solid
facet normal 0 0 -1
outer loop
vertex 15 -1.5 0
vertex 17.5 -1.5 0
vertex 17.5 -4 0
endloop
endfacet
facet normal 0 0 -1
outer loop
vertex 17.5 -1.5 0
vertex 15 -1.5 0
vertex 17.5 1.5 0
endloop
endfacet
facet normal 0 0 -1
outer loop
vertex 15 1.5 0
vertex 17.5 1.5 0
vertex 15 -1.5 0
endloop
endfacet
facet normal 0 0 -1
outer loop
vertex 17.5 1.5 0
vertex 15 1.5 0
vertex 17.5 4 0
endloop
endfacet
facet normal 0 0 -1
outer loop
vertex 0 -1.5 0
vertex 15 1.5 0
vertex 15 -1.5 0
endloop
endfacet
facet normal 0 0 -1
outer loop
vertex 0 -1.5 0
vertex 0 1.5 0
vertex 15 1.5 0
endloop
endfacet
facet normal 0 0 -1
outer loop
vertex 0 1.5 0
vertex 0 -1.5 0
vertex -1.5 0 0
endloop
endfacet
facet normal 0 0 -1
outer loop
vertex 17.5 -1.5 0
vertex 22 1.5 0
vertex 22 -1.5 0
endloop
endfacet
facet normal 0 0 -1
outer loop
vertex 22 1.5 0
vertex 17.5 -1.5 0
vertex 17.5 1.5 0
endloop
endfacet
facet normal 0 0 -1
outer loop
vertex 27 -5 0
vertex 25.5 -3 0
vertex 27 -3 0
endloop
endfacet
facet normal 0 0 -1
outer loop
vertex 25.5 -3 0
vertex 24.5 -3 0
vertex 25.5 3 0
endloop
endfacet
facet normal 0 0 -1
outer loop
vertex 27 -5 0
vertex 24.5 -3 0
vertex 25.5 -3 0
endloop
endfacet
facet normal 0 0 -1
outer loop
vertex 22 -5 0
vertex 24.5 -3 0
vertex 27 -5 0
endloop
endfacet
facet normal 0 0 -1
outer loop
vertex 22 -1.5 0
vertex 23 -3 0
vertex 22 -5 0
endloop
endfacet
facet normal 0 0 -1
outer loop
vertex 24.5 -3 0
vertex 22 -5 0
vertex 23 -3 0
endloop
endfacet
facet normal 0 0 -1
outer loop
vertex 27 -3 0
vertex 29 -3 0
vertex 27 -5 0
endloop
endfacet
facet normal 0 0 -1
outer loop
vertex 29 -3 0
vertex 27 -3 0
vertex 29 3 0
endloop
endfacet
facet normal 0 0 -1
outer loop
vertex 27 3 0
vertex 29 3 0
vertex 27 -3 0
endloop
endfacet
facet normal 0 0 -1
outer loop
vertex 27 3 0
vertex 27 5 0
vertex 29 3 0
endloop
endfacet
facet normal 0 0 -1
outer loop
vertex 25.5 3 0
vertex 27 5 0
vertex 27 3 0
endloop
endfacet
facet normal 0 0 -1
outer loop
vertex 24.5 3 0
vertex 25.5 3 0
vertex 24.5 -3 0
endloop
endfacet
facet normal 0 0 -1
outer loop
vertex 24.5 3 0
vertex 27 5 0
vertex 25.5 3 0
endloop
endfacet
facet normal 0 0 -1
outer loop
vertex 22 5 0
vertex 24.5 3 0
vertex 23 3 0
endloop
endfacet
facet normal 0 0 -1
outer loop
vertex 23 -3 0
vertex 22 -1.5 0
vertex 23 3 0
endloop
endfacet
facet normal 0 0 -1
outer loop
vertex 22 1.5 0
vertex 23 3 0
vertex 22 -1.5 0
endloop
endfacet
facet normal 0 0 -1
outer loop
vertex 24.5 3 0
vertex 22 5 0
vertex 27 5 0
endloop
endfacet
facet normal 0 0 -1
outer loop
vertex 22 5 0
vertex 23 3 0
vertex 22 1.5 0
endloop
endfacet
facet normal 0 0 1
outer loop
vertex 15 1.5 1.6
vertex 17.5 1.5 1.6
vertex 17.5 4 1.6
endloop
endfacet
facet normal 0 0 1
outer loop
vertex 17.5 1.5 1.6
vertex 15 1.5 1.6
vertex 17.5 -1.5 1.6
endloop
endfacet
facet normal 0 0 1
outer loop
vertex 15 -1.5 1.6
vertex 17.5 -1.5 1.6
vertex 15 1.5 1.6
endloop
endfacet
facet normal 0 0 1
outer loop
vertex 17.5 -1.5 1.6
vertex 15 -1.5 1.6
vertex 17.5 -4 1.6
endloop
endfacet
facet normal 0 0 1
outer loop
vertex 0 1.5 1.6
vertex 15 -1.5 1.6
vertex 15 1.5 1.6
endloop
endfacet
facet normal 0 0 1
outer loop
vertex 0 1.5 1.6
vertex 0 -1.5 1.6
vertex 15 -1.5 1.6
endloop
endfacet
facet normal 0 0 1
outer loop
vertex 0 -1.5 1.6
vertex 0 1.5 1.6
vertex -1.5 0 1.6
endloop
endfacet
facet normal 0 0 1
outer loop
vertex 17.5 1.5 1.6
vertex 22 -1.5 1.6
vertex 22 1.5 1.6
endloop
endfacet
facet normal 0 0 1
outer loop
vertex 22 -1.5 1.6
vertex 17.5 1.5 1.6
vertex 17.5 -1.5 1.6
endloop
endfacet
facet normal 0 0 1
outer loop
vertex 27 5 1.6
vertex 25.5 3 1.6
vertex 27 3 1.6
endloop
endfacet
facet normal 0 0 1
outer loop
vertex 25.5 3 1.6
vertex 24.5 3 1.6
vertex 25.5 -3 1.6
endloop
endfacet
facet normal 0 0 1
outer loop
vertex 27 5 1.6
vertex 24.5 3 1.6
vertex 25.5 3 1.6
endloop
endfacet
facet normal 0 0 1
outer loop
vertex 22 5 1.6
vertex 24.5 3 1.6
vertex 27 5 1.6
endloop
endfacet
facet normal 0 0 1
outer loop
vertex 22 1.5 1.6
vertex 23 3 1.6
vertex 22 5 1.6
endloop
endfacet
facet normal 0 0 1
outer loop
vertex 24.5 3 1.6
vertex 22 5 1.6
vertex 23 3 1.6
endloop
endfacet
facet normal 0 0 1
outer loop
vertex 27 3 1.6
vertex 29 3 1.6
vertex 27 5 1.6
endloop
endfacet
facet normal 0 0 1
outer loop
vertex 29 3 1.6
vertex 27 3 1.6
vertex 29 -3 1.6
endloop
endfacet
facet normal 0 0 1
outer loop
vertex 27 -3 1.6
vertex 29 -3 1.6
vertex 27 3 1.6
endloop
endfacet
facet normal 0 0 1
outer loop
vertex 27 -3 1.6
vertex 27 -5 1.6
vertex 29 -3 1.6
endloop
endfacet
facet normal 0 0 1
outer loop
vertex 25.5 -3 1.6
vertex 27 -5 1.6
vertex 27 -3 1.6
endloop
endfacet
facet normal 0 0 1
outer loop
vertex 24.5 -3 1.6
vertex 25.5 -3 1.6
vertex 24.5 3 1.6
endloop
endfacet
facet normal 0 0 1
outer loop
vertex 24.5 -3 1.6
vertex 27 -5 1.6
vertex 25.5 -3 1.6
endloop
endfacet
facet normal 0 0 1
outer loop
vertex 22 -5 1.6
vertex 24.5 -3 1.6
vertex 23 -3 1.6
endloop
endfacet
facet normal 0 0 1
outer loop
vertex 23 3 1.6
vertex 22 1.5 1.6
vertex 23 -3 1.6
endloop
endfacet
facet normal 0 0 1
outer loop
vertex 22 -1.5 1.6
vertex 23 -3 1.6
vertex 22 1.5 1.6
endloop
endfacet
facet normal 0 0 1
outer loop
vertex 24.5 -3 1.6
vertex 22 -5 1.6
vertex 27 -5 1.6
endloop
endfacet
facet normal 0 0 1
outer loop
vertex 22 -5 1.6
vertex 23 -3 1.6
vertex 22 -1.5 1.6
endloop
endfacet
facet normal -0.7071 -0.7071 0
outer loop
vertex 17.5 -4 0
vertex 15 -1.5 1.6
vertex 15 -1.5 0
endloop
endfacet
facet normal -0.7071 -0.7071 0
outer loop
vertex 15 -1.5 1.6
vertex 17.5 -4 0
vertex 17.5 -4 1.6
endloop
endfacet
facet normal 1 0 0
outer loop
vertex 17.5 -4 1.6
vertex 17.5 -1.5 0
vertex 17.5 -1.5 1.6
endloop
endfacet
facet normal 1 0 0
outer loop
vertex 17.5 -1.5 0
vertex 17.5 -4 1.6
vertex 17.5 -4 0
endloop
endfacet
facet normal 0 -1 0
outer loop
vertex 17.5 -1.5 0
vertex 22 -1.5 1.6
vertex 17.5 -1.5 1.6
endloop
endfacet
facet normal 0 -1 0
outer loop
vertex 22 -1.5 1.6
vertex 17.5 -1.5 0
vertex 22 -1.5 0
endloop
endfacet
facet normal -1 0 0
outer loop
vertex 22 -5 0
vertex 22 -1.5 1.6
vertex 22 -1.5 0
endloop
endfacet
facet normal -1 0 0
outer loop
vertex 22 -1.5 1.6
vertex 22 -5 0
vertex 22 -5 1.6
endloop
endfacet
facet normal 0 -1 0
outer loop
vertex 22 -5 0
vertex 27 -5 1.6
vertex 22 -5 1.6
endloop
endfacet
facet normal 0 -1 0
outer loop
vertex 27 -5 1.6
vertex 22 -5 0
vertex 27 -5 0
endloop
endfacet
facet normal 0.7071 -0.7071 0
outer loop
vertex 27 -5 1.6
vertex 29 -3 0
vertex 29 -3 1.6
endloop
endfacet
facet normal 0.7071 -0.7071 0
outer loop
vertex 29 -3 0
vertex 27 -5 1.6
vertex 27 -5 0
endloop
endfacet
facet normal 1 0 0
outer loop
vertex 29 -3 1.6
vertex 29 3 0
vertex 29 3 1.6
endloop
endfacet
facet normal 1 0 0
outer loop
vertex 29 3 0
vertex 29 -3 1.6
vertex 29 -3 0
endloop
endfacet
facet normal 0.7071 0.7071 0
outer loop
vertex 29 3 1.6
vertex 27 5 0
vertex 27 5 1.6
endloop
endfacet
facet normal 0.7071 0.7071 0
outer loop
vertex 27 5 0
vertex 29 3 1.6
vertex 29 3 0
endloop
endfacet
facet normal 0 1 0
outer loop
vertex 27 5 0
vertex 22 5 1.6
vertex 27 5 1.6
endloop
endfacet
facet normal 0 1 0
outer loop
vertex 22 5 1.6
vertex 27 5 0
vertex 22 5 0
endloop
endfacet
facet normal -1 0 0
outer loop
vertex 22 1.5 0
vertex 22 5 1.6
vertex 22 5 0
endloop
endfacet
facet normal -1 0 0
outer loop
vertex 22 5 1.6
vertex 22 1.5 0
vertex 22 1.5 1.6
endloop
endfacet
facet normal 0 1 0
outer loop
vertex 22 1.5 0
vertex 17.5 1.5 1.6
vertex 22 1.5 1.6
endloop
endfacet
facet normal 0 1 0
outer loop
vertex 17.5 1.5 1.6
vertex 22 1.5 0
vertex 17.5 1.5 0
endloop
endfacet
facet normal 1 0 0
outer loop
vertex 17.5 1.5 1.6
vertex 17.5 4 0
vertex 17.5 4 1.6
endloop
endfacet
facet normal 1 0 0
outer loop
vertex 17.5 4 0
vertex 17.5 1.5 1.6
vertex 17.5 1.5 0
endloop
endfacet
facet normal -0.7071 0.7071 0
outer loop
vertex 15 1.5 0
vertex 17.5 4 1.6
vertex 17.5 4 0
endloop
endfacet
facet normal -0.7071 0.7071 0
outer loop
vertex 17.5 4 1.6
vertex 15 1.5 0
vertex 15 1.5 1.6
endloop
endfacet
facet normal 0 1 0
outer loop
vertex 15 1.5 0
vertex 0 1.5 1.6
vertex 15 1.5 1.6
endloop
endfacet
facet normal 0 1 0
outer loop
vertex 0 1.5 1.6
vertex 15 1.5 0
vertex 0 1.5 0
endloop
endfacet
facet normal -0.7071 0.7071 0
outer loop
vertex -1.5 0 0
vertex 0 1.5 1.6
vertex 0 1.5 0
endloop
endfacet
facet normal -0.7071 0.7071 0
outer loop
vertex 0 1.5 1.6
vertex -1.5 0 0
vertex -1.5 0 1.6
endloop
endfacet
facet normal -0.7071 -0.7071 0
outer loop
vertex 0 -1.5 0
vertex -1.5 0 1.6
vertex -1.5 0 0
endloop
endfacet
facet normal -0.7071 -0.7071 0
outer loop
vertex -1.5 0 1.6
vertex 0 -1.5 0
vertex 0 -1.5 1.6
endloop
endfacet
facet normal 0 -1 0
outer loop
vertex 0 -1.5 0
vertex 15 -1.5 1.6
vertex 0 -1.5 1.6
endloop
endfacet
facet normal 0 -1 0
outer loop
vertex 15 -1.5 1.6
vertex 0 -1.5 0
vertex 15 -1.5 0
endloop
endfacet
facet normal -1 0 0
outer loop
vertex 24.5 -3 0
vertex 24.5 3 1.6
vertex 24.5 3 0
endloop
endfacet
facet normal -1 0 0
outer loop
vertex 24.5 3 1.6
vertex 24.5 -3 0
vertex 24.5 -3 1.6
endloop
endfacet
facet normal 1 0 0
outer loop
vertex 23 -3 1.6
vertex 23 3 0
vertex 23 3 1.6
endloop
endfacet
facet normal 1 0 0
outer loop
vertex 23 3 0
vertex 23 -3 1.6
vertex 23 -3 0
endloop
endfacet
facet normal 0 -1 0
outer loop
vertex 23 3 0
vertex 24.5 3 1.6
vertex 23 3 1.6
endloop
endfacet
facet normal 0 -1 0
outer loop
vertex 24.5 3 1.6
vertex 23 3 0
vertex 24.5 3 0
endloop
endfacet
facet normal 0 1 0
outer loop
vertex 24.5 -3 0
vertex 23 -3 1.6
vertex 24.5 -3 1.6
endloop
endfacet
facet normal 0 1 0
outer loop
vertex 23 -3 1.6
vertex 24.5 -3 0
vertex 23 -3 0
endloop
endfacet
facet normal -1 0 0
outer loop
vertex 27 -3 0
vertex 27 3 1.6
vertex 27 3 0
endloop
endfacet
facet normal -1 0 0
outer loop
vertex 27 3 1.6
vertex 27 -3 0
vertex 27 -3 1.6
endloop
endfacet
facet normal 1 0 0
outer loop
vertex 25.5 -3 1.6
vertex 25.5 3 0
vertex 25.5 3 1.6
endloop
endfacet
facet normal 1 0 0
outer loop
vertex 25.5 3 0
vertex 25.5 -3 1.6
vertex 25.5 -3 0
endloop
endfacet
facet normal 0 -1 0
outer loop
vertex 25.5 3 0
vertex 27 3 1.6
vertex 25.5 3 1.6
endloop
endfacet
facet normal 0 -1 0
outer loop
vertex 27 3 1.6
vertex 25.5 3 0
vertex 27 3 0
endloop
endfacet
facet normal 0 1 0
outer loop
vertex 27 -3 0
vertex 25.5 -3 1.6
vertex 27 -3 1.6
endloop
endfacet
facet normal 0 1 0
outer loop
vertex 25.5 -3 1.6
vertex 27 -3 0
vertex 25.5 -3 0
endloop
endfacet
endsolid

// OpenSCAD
W=1.6;

U=1.5;
V=1;

D1=1.5;
L=15;
D2=4;
L2=L+7;
L3=L2+3*V+2*U+V;
D3=5;



P=[
    [-D1,0],
    [0,D1],
    [L,D1],
    [L+D2-D1,D2],
    [L+D2-D1,D1],
    [L2,D1],
    [L2,D3],
    [L3-2,D3],
    [L3,D3-2],
    [L3,0],
];

difference() {
    linear_extrude(W) {
        polygon(P);
        mirror([0,1,0])
        polygon(P);
    }
    translate([L2+V+U/2,0,0])
    cube([U,6,20],center=true);
    translate([L2+V+U+V+U/2,0,0])
    cube([U,6,20],center=true);
}
